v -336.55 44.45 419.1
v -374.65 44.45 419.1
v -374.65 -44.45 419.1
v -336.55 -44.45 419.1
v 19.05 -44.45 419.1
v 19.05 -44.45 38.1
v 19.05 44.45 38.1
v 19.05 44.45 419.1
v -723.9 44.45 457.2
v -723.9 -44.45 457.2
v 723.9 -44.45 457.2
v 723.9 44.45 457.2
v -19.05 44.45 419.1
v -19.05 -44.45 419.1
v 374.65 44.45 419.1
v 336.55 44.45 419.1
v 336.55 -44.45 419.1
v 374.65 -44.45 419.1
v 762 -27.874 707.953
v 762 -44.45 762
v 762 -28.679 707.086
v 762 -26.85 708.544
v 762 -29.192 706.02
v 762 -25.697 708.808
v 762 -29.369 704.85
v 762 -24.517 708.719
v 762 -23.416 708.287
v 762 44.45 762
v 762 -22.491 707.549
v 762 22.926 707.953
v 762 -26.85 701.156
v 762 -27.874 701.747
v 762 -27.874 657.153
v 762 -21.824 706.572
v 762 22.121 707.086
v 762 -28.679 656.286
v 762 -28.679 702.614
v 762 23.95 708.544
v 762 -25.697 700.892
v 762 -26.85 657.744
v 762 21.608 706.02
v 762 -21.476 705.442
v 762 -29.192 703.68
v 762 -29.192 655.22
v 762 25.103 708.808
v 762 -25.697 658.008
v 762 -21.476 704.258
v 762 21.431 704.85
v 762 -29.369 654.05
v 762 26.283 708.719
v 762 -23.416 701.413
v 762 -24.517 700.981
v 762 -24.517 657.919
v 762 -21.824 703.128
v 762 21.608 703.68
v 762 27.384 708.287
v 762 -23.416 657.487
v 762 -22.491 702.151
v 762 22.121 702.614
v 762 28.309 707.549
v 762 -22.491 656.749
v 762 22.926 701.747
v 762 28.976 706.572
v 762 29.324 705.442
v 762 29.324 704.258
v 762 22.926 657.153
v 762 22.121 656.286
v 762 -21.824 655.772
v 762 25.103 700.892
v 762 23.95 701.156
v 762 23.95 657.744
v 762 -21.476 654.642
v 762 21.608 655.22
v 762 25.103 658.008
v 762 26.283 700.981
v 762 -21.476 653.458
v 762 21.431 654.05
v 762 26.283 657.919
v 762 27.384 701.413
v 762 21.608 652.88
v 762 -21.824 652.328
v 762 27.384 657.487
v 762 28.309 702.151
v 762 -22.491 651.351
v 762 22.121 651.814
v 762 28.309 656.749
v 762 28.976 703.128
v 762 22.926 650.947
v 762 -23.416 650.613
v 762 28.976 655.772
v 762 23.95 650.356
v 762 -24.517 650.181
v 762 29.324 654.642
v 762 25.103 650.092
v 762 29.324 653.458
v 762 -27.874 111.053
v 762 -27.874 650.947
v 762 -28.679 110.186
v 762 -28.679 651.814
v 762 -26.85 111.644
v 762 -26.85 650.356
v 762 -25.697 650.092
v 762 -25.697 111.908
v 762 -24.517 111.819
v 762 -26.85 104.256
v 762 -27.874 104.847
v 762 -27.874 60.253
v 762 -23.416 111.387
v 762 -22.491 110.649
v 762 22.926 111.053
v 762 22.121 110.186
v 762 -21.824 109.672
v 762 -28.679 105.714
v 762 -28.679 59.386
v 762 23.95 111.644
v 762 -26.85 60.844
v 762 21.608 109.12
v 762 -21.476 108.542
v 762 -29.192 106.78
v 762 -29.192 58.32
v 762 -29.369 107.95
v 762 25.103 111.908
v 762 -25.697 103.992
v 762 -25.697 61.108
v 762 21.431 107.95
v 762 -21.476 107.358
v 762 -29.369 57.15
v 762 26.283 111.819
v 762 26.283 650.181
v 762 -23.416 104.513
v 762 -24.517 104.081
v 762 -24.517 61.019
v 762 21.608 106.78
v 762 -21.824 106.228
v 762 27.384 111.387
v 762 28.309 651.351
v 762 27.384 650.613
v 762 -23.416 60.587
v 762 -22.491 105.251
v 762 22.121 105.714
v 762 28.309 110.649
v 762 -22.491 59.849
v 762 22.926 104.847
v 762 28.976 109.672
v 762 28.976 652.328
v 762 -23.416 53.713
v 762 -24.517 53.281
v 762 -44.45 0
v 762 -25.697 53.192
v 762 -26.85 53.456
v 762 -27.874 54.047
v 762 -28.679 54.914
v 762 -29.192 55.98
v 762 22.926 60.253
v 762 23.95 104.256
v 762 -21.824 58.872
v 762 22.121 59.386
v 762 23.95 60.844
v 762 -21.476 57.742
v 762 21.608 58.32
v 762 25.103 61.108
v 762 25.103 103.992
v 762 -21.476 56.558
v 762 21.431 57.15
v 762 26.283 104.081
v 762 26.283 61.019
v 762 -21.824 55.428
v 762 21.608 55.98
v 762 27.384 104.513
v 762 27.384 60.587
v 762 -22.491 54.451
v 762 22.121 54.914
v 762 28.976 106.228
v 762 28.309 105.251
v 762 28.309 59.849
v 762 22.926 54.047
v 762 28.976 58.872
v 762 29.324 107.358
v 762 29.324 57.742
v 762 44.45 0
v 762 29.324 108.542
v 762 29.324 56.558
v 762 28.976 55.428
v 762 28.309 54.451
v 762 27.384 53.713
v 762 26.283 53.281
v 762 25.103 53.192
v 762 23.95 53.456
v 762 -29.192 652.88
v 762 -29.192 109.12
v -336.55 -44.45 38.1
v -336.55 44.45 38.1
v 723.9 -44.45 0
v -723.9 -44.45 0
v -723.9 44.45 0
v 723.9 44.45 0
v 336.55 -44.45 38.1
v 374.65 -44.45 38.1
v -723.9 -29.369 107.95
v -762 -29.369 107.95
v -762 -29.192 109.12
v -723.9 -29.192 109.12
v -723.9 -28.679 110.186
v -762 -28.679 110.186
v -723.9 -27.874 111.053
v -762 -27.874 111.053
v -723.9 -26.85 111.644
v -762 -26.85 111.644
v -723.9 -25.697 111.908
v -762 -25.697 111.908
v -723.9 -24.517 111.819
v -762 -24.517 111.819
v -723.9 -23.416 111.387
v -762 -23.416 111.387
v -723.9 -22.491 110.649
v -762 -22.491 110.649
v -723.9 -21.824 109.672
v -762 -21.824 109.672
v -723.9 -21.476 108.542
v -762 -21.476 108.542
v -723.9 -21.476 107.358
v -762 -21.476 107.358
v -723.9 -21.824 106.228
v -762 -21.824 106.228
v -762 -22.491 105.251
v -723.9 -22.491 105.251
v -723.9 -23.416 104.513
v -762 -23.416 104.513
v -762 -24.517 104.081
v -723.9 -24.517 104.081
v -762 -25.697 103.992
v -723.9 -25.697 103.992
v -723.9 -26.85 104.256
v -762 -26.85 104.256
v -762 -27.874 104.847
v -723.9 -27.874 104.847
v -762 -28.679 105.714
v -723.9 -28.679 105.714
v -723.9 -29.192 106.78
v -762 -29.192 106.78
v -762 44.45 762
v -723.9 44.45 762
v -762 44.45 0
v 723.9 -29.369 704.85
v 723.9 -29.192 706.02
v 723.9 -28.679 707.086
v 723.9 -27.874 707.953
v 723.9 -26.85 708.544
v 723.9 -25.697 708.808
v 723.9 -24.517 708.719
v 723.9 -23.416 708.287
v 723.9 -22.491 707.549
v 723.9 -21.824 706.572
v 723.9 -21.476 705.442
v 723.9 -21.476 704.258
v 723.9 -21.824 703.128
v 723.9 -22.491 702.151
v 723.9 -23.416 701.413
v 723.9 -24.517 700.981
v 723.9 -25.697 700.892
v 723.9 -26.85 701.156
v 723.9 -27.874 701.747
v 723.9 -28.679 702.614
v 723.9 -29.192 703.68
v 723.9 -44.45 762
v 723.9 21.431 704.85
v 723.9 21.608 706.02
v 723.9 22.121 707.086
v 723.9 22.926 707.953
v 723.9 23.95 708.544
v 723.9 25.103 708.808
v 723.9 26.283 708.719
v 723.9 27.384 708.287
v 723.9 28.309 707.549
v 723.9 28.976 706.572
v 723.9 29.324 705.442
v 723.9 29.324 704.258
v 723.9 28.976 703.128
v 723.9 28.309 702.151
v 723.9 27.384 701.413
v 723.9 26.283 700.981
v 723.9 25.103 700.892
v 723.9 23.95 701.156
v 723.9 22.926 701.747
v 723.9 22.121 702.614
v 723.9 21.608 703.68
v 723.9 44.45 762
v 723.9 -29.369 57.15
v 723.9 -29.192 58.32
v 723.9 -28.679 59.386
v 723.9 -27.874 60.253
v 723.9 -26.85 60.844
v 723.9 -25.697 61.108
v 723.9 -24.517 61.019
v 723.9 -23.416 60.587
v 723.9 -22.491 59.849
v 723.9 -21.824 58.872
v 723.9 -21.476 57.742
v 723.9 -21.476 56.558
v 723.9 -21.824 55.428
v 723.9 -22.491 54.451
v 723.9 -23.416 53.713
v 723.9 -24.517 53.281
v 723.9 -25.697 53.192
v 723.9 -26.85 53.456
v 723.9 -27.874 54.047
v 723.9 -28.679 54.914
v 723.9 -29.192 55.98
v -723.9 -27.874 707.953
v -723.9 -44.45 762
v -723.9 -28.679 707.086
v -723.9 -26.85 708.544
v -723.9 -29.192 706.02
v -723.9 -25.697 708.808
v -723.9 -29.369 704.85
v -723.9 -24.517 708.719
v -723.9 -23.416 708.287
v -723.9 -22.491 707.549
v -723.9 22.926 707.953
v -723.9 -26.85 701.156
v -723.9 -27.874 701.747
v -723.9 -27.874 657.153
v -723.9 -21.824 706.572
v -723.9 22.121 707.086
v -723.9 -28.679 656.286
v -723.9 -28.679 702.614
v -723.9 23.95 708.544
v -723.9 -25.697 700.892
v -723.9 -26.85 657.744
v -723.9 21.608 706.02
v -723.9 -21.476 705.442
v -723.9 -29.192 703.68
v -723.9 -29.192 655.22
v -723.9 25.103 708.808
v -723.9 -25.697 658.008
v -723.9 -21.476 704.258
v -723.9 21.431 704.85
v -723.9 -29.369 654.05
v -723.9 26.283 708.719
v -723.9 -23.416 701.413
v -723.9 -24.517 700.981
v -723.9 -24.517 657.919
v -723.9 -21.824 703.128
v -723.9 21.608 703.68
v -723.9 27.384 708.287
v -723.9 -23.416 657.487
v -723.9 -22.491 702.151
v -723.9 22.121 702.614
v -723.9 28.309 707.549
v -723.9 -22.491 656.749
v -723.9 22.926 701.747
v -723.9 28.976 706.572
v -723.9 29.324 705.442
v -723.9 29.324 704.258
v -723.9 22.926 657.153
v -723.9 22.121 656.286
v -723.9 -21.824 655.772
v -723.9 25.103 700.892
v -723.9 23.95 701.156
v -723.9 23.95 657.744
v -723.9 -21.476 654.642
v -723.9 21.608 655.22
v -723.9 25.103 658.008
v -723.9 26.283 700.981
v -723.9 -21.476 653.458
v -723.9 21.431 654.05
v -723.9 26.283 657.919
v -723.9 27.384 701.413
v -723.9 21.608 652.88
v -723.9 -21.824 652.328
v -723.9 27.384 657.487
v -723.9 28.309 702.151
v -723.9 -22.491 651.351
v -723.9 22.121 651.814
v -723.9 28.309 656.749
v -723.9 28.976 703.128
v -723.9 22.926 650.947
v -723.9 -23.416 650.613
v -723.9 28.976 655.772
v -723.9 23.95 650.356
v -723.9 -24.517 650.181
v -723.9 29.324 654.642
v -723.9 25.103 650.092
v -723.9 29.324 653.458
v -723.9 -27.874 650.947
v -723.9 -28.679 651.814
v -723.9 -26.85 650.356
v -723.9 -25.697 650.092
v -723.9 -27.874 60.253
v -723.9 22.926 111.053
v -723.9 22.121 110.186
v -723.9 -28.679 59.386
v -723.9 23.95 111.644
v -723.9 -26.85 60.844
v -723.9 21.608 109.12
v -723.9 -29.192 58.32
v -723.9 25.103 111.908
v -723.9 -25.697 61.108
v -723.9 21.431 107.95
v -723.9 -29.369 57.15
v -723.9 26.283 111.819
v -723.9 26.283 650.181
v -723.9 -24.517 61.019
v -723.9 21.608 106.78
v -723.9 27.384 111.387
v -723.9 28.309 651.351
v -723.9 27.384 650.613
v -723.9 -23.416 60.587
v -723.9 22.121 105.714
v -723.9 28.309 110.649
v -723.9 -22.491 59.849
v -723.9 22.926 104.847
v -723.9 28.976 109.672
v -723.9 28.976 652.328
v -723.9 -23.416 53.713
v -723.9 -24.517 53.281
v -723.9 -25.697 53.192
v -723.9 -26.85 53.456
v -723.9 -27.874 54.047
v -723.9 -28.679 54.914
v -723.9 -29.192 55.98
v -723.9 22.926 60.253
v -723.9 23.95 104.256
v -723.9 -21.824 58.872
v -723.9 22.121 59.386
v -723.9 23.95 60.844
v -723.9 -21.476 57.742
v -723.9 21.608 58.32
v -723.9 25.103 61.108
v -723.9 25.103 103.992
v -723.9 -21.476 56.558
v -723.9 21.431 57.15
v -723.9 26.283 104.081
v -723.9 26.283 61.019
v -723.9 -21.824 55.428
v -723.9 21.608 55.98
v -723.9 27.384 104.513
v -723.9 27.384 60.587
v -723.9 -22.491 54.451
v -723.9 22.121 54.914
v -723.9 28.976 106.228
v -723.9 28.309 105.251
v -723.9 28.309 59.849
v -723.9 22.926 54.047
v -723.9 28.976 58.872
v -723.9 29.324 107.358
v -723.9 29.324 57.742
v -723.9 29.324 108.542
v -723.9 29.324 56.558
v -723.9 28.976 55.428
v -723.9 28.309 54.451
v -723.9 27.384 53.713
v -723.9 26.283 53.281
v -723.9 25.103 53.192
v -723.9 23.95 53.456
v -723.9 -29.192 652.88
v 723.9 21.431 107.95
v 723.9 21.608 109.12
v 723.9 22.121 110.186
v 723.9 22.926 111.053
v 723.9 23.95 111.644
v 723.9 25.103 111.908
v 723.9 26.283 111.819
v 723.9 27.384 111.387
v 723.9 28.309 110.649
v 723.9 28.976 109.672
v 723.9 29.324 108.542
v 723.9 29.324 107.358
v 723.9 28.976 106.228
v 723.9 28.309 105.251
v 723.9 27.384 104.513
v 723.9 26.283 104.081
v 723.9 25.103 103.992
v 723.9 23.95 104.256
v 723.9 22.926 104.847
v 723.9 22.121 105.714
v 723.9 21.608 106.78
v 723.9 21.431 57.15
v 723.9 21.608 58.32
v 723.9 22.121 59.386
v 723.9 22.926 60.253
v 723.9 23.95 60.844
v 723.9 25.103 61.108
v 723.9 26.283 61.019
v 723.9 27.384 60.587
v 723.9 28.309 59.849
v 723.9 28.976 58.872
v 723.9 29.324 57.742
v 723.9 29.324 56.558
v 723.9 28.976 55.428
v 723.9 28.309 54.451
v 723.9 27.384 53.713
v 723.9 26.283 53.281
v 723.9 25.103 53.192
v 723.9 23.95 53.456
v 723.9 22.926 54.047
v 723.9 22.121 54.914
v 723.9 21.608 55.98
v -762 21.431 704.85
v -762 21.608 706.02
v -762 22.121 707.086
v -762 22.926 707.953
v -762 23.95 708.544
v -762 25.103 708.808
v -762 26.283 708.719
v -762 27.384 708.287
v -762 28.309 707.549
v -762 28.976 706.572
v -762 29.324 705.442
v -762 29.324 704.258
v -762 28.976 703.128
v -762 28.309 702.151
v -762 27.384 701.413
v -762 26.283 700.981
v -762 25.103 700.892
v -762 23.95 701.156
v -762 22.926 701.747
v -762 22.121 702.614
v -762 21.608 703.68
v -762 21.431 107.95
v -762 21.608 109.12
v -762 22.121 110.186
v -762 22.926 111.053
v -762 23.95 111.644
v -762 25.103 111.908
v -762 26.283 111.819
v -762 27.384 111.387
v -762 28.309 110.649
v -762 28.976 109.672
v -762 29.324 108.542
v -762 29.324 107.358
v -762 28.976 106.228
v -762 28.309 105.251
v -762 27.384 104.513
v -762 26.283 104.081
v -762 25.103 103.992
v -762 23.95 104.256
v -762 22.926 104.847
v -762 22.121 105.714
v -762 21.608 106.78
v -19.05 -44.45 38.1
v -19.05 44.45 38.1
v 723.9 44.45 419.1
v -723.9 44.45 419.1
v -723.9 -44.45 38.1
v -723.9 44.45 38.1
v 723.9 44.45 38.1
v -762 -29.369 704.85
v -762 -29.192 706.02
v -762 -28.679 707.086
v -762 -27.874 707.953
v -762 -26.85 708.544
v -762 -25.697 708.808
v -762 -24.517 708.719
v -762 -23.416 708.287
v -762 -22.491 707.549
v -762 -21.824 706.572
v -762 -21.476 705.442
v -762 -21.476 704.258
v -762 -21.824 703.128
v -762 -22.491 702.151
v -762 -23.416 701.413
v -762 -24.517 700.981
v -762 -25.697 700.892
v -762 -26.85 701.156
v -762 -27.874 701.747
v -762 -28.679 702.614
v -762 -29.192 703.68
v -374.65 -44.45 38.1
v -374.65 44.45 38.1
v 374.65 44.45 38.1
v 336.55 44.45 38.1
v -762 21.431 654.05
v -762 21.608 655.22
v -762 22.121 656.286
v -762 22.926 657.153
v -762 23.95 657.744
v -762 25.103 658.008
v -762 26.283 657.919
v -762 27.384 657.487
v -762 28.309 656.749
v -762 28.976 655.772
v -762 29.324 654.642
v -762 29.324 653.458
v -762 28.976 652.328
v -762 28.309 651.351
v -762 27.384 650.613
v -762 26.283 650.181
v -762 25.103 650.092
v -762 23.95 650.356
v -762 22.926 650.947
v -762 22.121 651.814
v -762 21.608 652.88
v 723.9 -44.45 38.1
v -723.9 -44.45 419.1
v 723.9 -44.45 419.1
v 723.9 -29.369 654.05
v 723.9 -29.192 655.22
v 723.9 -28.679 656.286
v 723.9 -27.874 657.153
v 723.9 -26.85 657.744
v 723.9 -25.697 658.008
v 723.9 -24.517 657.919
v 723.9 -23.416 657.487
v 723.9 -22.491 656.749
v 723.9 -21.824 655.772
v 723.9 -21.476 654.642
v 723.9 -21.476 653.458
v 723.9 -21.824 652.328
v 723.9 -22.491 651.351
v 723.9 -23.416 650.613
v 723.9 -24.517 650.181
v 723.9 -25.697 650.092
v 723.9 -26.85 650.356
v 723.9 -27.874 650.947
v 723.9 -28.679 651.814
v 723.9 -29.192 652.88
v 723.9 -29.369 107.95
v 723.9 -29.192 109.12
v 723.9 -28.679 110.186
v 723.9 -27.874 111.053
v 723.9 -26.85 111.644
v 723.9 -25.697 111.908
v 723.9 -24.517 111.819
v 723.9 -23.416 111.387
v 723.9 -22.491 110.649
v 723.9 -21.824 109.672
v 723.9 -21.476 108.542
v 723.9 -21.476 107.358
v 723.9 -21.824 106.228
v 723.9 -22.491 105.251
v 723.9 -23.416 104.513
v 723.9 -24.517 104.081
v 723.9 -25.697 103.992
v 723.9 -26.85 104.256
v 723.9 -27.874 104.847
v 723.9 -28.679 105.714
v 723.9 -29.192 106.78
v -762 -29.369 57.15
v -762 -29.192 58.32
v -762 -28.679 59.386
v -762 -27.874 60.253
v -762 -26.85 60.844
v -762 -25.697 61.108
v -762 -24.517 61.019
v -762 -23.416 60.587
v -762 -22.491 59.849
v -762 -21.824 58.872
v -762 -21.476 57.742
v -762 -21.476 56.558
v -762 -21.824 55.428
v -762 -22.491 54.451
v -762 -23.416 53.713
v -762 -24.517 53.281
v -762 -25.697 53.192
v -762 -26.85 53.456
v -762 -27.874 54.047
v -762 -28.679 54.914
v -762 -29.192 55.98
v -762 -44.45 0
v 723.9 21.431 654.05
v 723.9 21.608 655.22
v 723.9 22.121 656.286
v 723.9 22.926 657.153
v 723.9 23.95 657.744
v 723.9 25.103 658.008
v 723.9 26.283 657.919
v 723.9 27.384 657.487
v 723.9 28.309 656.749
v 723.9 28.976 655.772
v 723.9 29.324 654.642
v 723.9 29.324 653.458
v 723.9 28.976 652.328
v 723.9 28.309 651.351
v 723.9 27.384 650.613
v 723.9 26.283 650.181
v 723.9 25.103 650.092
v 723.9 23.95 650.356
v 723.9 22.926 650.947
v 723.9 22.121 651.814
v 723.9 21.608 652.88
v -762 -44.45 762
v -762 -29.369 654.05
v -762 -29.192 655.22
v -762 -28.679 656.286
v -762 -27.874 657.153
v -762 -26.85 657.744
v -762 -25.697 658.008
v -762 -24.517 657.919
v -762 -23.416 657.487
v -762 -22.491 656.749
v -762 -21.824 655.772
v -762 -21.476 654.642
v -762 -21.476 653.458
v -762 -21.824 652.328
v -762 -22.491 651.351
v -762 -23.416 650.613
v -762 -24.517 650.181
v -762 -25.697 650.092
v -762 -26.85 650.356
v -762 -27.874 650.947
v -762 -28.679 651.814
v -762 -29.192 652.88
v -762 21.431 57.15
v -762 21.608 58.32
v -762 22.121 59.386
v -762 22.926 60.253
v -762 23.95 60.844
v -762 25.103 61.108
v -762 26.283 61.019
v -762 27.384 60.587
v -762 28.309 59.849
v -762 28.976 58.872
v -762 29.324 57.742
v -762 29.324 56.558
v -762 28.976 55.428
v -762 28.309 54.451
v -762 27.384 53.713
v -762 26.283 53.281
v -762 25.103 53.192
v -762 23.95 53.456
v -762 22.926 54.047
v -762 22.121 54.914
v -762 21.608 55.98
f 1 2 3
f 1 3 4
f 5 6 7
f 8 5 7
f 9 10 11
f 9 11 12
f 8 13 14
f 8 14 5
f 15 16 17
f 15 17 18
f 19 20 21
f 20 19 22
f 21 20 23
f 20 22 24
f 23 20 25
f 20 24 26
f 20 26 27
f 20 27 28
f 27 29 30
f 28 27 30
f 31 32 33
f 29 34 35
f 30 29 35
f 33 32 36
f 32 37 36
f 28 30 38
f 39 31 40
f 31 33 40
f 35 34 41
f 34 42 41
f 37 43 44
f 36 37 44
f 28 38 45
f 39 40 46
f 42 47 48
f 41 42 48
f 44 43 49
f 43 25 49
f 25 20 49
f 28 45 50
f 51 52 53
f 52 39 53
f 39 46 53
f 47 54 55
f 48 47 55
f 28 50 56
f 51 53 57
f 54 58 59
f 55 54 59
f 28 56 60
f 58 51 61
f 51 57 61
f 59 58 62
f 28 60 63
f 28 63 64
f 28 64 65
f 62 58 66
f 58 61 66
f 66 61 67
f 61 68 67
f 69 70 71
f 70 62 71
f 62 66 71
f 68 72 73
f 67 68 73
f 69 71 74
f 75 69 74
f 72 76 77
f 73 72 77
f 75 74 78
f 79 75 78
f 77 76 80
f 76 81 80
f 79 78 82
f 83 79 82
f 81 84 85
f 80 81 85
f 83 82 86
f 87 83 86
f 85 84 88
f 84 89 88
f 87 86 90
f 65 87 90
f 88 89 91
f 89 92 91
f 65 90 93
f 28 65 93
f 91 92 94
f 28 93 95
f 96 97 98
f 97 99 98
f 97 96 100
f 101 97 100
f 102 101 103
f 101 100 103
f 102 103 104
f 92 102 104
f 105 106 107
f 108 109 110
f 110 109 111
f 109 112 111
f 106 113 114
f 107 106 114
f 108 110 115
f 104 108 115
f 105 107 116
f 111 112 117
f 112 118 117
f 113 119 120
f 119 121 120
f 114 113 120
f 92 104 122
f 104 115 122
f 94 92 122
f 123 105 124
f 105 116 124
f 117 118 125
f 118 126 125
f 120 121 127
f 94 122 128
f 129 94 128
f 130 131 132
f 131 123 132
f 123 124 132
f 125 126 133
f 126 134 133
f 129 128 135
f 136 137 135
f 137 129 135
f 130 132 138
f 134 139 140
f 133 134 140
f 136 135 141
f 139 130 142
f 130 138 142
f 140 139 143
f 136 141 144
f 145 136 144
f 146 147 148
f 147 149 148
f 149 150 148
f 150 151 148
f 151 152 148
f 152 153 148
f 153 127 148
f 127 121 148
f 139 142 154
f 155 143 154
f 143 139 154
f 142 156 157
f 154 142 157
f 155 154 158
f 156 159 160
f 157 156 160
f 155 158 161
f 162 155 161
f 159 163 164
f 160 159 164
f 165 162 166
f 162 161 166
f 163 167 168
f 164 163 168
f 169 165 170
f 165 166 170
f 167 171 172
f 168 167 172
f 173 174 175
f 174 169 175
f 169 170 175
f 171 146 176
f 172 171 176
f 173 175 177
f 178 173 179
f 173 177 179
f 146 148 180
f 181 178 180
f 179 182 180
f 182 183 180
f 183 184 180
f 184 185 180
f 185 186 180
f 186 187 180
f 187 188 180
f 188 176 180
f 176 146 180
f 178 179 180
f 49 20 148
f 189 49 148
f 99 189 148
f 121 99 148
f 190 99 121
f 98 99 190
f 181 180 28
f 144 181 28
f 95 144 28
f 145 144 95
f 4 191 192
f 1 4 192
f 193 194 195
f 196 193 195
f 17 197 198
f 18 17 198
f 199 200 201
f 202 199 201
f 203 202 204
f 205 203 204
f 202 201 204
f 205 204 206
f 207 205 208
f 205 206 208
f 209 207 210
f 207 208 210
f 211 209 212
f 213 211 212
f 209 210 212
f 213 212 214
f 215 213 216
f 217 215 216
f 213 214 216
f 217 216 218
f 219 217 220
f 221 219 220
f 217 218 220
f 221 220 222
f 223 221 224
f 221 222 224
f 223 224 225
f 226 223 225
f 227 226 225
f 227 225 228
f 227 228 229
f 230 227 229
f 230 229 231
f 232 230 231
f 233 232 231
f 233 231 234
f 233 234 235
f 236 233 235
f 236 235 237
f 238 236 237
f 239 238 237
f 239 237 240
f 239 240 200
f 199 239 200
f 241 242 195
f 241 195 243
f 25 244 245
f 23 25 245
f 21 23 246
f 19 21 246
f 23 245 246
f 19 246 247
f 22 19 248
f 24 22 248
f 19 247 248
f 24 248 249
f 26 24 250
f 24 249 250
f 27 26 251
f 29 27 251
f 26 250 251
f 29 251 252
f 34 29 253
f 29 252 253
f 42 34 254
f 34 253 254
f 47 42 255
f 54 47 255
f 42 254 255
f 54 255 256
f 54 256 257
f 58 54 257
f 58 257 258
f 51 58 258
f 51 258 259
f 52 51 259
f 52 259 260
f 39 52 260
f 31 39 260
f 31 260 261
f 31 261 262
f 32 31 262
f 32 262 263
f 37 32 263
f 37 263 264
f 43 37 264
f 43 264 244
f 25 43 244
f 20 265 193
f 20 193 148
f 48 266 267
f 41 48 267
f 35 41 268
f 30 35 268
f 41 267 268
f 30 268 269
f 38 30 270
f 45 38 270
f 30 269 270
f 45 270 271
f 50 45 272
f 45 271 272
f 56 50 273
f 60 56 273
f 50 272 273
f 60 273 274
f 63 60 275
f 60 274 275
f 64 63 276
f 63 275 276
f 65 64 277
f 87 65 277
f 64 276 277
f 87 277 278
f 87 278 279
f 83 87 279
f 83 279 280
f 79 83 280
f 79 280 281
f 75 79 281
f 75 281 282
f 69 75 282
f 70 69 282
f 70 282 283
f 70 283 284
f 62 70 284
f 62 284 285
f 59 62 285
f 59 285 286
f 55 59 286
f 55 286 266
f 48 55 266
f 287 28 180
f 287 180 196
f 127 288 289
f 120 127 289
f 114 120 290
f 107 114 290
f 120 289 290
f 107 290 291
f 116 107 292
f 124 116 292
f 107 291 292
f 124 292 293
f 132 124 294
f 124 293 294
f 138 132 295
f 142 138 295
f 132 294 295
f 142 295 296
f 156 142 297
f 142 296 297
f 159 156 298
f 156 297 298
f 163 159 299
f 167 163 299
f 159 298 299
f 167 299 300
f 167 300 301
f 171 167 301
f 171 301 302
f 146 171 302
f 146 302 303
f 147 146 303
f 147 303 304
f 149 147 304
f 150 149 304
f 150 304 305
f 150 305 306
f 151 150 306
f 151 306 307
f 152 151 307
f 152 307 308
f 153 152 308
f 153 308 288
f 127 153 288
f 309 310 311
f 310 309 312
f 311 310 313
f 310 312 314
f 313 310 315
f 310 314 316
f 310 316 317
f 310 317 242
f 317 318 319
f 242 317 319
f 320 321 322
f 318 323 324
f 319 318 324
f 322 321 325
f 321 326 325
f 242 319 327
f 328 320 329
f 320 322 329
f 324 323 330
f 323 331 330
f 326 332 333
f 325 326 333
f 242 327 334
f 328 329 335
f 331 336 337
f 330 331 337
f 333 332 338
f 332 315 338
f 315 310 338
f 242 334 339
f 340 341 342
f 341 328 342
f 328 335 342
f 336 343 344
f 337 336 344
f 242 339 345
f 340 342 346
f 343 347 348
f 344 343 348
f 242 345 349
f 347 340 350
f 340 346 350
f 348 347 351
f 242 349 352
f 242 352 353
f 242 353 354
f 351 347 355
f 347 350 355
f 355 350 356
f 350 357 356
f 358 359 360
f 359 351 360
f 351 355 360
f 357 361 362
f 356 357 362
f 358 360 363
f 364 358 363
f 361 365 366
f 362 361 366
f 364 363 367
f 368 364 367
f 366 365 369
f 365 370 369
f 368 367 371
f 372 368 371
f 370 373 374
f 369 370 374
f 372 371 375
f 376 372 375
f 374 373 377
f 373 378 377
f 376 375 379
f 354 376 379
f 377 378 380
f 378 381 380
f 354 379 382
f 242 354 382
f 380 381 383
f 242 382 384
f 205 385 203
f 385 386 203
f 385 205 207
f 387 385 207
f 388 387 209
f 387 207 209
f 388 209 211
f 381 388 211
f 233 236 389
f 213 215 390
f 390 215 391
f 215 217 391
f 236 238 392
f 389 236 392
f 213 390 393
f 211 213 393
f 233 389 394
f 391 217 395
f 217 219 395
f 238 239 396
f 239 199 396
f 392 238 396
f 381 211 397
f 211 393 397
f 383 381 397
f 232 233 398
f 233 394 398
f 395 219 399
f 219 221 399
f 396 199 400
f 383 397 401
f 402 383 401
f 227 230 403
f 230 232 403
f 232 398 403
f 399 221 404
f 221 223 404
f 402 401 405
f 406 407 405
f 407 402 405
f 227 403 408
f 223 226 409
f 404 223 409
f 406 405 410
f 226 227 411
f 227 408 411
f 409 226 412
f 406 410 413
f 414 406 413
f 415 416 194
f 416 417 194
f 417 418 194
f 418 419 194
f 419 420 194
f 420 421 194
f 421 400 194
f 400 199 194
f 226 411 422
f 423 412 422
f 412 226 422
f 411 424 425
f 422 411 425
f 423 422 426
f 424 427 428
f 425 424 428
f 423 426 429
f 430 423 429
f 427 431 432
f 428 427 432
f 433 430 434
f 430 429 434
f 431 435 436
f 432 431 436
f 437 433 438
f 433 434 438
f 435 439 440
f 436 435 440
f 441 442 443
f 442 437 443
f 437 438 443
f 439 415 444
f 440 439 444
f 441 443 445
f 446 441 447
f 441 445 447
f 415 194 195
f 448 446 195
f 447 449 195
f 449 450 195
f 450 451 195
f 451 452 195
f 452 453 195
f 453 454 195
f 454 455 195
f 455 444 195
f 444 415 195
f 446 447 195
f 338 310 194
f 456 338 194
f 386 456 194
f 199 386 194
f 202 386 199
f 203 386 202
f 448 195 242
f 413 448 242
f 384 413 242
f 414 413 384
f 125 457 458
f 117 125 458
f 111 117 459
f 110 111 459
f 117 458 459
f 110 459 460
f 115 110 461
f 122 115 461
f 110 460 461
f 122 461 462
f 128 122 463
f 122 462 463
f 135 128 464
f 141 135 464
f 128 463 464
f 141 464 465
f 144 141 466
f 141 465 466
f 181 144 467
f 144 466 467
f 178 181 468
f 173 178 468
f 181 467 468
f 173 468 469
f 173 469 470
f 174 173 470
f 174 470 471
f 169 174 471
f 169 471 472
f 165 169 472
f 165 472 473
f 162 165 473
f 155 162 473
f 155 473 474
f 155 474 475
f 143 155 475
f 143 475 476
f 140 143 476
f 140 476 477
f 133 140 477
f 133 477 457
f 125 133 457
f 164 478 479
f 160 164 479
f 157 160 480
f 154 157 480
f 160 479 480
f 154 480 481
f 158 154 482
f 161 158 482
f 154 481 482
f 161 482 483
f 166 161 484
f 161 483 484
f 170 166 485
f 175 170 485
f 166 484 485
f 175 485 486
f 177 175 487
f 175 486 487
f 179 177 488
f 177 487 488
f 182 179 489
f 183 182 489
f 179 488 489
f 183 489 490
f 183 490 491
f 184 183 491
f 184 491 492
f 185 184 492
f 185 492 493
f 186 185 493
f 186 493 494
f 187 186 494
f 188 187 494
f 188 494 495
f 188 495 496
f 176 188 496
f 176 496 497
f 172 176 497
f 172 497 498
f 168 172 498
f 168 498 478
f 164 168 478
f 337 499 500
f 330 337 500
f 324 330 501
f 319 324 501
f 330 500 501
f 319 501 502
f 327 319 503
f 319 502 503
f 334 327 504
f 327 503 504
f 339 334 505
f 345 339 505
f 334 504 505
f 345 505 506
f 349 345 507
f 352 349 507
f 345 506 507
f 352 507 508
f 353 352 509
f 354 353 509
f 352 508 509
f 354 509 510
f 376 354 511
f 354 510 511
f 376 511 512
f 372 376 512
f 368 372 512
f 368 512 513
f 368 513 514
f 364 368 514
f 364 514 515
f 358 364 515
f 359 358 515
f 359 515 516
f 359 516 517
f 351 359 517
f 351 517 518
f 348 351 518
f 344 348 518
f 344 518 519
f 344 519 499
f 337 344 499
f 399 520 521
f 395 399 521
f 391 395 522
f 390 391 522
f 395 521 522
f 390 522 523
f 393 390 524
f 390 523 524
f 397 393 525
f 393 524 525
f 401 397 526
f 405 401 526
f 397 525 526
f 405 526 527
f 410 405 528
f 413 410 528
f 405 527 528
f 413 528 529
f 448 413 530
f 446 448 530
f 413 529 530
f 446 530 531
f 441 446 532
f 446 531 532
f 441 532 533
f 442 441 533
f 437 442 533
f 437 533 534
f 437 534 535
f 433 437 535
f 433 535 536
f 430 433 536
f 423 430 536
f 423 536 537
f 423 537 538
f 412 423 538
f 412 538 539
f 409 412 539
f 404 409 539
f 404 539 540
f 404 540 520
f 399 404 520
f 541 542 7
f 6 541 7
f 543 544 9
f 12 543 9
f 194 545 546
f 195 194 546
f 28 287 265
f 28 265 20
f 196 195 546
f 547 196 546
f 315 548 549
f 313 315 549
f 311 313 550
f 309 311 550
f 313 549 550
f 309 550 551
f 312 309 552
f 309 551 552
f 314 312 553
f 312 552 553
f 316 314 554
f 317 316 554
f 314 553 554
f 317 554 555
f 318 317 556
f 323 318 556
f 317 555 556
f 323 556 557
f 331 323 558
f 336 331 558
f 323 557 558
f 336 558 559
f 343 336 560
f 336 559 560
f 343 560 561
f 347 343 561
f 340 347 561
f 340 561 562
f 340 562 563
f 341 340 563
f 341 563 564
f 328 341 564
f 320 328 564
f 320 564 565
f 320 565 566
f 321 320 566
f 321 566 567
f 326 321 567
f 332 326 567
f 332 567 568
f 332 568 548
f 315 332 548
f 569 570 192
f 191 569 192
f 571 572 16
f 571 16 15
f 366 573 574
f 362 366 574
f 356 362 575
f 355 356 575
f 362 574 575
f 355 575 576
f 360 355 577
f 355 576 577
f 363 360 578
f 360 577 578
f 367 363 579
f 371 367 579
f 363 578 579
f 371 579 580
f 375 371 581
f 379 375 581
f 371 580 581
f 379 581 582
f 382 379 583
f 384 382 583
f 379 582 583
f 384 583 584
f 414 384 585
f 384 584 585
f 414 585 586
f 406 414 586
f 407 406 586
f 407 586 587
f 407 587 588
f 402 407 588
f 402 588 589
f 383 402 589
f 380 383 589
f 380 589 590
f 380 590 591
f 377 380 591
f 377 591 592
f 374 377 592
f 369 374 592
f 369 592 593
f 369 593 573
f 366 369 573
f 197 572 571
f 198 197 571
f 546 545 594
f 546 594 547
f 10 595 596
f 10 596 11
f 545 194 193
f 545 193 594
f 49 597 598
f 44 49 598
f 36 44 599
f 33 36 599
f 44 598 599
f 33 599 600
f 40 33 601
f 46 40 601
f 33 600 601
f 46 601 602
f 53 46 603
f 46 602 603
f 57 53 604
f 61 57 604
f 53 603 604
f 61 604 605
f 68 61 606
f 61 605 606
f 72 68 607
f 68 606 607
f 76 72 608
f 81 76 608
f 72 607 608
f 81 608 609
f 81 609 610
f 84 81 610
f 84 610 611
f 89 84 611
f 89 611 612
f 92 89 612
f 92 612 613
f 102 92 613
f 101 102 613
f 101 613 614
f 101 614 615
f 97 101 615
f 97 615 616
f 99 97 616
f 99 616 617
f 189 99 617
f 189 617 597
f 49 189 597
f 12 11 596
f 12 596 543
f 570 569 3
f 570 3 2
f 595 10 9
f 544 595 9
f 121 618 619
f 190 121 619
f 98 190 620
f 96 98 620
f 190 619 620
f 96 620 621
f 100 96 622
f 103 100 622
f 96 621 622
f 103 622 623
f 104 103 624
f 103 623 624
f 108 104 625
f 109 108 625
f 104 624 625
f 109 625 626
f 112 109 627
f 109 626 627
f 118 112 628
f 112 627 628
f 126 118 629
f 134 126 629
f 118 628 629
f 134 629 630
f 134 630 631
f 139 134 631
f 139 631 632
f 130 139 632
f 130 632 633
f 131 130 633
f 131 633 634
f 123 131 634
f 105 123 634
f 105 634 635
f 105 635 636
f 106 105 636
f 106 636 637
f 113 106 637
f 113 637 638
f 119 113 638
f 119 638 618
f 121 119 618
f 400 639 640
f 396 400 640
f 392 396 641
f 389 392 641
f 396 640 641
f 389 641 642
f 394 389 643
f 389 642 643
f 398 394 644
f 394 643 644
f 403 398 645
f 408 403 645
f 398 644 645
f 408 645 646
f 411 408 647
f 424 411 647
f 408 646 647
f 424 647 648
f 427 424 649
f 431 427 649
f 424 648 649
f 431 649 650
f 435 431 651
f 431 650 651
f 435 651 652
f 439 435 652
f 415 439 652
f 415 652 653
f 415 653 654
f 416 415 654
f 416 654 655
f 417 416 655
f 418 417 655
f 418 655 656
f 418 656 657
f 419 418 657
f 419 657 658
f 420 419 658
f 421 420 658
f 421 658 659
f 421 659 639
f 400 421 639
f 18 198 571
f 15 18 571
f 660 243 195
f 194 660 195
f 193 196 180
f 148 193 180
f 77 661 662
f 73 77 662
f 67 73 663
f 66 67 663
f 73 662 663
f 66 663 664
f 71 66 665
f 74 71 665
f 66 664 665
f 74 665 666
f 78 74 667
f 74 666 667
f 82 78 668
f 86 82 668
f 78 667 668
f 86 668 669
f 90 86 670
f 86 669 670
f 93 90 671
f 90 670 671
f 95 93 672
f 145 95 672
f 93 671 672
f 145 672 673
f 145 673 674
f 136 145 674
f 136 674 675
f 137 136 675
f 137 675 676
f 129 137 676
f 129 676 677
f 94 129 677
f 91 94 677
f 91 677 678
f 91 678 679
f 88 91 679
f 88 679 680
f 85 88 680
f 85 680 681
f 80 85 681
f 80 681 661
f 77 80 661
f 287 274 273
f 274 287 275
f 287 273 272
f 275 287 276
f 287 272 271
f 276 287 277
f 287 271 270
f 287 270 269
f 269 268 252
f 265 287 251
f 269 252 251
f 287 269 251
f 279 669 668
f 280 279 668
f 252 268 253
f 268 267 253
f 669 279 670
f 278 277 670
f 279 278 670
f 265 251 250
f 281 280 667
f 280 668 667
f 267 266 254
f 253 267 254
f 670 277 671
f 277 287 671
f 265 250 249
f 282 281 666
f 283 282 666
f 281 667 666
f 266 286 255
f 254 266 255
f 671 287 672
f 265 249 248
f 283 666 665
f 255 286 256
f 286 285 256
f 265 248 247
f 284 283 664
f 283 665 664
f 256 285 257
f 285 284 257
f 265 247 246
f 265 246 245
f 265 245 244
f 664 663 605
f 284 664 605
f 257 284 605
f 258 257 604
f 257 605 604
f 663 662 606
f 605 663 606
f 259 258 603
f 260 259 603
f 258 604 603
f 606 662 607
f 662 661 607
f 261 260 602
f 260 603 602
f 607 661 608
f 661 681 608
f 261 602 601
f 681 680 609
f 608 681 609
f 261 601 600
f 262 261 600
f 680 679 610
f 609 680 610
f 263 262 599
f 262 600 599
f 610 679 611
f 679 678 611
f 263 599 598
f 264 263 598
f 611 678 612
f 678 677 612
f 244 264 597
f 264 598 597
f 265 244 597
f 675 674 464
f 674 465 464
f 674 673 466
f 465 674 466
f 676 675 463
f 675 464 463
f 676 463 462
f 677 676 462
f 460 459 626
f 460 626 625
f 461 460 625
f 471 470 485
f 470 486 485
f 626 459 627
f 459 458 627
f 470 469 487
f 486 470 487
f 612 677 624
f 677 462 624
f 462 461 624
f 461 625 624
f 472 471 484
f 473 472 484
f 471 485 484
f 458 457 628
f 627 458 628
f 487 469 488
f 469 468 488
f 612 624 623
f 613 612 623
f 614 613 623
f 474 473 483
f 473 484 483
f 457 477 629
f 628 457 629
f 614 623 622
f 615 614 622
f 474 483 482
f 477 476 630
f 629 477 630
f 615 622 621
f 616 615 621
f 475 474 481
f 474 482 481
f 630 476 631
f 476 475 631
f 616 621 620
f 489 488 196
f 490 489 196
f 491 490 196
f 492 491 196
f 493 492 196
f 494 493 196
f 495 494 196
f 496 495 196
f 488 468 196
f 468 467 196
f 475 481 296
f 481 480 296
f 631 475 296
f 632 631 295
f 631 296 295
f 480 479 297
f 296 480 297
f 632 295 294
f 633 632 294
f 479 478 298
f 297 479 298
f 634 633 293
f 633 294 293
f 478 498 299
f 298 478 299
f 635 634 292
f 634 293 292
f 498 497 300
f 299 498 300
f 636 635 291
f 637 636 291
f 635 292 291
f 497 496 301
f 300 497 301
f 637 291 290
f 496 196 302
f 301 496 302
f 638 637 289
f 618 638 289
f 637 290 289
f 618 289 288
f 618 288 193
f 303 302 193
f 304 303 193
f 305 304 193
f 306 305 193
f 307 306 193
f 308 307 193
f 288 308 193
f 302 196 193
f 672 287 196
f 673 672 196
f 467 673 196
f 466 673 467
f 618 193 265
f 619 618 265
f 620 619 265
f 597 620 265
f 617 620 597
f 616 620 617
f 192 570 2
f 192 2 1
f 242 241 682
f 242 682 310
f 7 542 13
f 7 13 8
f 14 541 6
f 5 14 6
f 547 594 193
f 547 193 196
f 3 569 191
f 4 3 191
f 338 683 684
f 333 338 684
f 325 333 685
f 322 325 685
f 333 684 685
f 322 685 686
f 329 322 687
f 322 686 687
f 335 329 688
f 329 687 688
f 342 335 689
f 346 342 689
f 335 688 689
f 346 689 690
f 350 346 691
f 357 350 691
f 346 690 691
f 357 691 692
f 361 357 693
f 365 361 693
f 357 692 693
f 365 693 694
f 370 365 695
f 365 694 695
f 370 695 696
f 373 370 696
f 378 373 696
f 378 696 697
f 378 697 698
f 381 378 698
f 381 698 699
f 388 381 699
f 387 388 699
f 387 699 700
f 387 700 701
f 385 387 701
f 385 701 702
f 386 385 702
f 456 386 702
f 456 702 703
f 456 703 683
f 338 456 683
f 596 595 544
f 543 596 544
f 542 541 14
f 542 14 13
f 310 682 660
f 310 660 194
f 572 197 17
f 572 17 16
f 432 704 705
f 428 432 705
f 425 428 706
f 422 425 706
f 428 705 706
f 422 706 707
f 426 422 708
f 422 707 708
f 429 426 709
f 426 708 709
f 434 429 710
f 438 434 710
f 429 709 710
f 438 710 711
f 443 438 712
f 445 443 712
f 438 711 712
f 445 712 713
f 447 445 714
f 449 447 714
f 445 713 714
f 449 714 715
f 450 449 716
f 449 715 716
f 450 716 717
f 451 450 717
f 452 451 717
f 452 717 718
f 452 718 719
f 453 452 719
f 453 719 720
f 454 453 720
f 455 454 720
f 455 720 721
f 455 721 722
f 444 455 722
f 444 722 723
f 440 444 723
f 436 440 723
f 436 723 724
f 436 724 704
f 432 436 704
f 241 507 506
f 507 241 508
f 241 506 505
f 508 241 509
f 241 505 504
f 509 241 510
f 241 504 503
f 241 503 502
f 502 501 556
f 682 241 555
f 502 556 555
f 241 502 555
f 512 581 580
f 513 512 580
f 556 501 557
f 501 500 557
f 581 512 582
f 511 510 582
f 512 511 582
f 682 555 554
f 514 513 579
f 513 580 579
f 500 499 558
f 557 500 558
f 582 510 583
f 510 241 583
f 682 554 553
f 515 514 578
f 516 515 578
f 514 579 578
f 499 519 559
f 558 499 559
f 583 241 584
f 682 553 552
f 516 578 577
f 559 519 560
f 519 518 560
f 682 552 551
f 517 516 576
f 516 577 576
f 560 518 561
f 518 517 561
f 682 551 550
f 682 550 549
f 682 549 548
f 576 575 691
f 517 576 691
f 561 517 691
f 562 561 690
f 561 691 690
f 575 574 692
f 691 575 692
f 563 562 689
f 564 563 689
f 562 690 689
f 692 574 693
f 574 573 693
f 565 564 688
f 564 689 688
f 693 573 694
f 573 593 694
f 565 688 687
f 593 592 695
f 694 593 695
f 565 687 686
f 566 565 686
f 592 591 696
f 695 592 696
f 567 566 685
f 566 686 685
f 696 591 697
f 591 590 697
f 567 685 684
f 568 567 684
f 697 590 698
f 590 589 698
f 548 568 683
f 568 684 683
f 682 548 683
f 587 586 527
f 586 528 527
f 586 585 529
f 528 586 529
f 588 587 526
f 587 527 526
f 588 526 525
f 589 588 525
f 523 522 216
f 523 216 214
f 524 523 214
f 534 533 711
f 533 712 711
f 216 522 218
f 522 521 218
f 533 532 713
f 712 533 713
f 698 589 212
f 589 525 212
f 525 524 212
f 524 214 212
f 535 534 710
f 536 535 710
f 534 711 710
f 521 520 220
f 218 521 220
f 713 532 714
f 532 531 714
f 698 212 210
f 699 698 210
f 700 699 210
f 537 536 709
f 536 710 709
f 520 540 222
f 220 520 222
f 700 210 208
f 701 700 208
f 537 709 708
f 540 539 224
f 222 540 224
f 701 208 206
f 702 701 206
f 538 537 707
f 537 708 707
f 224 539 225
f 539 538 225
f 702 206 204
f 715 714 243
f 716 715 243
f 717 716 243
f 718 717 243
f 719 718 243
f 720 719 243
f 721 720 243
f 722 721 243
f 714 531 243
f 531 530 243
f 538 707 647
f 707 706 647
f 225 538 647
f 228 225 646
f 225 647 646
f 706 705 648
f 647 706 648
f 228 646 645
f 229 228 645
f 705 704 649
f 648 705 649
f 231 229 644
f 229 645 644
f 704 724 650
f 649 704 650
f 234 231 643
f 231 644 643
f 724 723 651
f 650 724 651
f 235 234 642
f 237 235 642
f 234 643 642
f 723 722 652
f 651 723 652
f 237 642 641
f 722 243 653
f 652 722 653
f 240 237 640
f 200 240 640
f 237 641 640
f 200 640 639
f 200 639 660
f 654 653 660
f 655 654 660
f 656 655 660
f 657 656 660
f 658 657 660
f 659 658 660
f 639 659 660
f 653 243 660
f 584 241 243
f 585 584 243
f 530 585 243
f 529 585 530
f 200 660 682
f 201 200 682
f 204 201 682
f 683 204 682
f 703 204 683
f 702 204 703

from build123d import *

# Parameters (mm, degrees)
F1_DEPTH = 762
F2_W     = 88.9
F2_H     = 38.1
F3_DEPTH = 1447.8
F4_W     = 38.1
F4_H     = 88.9
F5_DEPTH = 381
F6_R     = 3.96875
F7_DEPTH = 1524.001


with BuildPart() as f1:
    # F0 (on Top) → F1 (new body)
    with BuildSketch(Plane.XY):
        Polygon((-723.9, 0), (-723.9, 44.45), (-762, 44.45), (-762, -44.45), (-723.9, -44.45), align=None)
    extrude(amount=F1_DEPTH)


with BuildPart() as f1b:
    # F0 (on Top) → F1, piece 2 (new body)
    with BuildSketch(Plane.XY):
        Polygon((723.9, 44.45), (723.9, 0), (723.9, -44.45), (762, -44.45), (762, 44.45), align=None)
    extrude(amount=F1_DEPTH)


with BuildPart() as f3:
    # F2 (on face) → F3 (new body, through all)
    with BuildSketch(Plane.YZ.offset(-723.9)):
        with Locations((0, 19.05)):
            Rectangle(F2_W, F2_H)
    extrude(amount=F3_DEPTH)


with BuildPart() as f3b:
    # F2 (on face) → F3, piece 2 (new body, through all)
    with BuildSketch(Plane.YZ.offset(-723.9)):
        with Locations((0, 438.15)):
            Rectangle(F2_W, F2_H)
    extrude(amount=F3_DEPTH)


with BuildPart() as f5:
    # F4 (on face) → F5 (new body, through all)
    with BuildSketch(Plane.XY.offset(38.1)):
        Rectangle(F4_W, F4_H)
    extrude(amount=F5_DEPTH)


with BuildPart() as f5b:
    # F4 (on face) → F5, piece 2 (new body, through all)
    with BuildSketch(Plane.XY.offset(38.1)):
        with Locations((-355.6, 0)):
            Rectangle(F4_W, F4_H)
    extrude(amount=F5_DEPTH)


with BuildPart() as f5c:
    # F4 (on face) → F5, piece 3 (new body, through all)
    with BuildSketch(Plane.XY.offset(38.1)):
        with Locations((355.6, 0)):
            Rectangle(F4_W, F4_H)
    extrude(amount=F5_DEPTH)


with BuildPart() as f7_tool:
    # F6 (on face) → F7 (new body, through all)
    with BuildSketch(Plane(origin=(-762, 0, 0), x_dir=(0, -1, 0), z_dir=(-1, 0, 0))):
        with Locations((-25.4, 57.15)):
            Circle(F6_R)
        with Locations((-25.4, 107.95)):
            Circle(F6_R)
        with Locations((25.4, 107.95)):
            Circle(F6_R)
        with Locations((25.4, 57.15)):
            Circle(F6_R)
        with Locations((-25.4, 654.05)):
            Circle(F6_R)
        with Locations((-25.4, 704.85)):
            Circle(F6_R)
        with Locations((25.4, 704.85)):
            Circle(F6_R)
        with Locations((25.4, 654.05)):
            Circle(F6_R)
    extrude(amount=-F7_DEPTH)


with BuildPart() as f1_1:
    add(f1.part)

    # F7: cut by f7_tool
    add(f7_tool.part, mode=Mode.SUBTRACT)


with BuildPart() as f1b_1:
    add(f1b.part)

    # F7: cut by f7_tool
    add(f7_tool.part, mode=Mode.SUBTRACT)


solid = Compound([f3.part, f3b.part, f5.part, f5b.part, f5c.part, f1_1.part, f1b_1.part])
